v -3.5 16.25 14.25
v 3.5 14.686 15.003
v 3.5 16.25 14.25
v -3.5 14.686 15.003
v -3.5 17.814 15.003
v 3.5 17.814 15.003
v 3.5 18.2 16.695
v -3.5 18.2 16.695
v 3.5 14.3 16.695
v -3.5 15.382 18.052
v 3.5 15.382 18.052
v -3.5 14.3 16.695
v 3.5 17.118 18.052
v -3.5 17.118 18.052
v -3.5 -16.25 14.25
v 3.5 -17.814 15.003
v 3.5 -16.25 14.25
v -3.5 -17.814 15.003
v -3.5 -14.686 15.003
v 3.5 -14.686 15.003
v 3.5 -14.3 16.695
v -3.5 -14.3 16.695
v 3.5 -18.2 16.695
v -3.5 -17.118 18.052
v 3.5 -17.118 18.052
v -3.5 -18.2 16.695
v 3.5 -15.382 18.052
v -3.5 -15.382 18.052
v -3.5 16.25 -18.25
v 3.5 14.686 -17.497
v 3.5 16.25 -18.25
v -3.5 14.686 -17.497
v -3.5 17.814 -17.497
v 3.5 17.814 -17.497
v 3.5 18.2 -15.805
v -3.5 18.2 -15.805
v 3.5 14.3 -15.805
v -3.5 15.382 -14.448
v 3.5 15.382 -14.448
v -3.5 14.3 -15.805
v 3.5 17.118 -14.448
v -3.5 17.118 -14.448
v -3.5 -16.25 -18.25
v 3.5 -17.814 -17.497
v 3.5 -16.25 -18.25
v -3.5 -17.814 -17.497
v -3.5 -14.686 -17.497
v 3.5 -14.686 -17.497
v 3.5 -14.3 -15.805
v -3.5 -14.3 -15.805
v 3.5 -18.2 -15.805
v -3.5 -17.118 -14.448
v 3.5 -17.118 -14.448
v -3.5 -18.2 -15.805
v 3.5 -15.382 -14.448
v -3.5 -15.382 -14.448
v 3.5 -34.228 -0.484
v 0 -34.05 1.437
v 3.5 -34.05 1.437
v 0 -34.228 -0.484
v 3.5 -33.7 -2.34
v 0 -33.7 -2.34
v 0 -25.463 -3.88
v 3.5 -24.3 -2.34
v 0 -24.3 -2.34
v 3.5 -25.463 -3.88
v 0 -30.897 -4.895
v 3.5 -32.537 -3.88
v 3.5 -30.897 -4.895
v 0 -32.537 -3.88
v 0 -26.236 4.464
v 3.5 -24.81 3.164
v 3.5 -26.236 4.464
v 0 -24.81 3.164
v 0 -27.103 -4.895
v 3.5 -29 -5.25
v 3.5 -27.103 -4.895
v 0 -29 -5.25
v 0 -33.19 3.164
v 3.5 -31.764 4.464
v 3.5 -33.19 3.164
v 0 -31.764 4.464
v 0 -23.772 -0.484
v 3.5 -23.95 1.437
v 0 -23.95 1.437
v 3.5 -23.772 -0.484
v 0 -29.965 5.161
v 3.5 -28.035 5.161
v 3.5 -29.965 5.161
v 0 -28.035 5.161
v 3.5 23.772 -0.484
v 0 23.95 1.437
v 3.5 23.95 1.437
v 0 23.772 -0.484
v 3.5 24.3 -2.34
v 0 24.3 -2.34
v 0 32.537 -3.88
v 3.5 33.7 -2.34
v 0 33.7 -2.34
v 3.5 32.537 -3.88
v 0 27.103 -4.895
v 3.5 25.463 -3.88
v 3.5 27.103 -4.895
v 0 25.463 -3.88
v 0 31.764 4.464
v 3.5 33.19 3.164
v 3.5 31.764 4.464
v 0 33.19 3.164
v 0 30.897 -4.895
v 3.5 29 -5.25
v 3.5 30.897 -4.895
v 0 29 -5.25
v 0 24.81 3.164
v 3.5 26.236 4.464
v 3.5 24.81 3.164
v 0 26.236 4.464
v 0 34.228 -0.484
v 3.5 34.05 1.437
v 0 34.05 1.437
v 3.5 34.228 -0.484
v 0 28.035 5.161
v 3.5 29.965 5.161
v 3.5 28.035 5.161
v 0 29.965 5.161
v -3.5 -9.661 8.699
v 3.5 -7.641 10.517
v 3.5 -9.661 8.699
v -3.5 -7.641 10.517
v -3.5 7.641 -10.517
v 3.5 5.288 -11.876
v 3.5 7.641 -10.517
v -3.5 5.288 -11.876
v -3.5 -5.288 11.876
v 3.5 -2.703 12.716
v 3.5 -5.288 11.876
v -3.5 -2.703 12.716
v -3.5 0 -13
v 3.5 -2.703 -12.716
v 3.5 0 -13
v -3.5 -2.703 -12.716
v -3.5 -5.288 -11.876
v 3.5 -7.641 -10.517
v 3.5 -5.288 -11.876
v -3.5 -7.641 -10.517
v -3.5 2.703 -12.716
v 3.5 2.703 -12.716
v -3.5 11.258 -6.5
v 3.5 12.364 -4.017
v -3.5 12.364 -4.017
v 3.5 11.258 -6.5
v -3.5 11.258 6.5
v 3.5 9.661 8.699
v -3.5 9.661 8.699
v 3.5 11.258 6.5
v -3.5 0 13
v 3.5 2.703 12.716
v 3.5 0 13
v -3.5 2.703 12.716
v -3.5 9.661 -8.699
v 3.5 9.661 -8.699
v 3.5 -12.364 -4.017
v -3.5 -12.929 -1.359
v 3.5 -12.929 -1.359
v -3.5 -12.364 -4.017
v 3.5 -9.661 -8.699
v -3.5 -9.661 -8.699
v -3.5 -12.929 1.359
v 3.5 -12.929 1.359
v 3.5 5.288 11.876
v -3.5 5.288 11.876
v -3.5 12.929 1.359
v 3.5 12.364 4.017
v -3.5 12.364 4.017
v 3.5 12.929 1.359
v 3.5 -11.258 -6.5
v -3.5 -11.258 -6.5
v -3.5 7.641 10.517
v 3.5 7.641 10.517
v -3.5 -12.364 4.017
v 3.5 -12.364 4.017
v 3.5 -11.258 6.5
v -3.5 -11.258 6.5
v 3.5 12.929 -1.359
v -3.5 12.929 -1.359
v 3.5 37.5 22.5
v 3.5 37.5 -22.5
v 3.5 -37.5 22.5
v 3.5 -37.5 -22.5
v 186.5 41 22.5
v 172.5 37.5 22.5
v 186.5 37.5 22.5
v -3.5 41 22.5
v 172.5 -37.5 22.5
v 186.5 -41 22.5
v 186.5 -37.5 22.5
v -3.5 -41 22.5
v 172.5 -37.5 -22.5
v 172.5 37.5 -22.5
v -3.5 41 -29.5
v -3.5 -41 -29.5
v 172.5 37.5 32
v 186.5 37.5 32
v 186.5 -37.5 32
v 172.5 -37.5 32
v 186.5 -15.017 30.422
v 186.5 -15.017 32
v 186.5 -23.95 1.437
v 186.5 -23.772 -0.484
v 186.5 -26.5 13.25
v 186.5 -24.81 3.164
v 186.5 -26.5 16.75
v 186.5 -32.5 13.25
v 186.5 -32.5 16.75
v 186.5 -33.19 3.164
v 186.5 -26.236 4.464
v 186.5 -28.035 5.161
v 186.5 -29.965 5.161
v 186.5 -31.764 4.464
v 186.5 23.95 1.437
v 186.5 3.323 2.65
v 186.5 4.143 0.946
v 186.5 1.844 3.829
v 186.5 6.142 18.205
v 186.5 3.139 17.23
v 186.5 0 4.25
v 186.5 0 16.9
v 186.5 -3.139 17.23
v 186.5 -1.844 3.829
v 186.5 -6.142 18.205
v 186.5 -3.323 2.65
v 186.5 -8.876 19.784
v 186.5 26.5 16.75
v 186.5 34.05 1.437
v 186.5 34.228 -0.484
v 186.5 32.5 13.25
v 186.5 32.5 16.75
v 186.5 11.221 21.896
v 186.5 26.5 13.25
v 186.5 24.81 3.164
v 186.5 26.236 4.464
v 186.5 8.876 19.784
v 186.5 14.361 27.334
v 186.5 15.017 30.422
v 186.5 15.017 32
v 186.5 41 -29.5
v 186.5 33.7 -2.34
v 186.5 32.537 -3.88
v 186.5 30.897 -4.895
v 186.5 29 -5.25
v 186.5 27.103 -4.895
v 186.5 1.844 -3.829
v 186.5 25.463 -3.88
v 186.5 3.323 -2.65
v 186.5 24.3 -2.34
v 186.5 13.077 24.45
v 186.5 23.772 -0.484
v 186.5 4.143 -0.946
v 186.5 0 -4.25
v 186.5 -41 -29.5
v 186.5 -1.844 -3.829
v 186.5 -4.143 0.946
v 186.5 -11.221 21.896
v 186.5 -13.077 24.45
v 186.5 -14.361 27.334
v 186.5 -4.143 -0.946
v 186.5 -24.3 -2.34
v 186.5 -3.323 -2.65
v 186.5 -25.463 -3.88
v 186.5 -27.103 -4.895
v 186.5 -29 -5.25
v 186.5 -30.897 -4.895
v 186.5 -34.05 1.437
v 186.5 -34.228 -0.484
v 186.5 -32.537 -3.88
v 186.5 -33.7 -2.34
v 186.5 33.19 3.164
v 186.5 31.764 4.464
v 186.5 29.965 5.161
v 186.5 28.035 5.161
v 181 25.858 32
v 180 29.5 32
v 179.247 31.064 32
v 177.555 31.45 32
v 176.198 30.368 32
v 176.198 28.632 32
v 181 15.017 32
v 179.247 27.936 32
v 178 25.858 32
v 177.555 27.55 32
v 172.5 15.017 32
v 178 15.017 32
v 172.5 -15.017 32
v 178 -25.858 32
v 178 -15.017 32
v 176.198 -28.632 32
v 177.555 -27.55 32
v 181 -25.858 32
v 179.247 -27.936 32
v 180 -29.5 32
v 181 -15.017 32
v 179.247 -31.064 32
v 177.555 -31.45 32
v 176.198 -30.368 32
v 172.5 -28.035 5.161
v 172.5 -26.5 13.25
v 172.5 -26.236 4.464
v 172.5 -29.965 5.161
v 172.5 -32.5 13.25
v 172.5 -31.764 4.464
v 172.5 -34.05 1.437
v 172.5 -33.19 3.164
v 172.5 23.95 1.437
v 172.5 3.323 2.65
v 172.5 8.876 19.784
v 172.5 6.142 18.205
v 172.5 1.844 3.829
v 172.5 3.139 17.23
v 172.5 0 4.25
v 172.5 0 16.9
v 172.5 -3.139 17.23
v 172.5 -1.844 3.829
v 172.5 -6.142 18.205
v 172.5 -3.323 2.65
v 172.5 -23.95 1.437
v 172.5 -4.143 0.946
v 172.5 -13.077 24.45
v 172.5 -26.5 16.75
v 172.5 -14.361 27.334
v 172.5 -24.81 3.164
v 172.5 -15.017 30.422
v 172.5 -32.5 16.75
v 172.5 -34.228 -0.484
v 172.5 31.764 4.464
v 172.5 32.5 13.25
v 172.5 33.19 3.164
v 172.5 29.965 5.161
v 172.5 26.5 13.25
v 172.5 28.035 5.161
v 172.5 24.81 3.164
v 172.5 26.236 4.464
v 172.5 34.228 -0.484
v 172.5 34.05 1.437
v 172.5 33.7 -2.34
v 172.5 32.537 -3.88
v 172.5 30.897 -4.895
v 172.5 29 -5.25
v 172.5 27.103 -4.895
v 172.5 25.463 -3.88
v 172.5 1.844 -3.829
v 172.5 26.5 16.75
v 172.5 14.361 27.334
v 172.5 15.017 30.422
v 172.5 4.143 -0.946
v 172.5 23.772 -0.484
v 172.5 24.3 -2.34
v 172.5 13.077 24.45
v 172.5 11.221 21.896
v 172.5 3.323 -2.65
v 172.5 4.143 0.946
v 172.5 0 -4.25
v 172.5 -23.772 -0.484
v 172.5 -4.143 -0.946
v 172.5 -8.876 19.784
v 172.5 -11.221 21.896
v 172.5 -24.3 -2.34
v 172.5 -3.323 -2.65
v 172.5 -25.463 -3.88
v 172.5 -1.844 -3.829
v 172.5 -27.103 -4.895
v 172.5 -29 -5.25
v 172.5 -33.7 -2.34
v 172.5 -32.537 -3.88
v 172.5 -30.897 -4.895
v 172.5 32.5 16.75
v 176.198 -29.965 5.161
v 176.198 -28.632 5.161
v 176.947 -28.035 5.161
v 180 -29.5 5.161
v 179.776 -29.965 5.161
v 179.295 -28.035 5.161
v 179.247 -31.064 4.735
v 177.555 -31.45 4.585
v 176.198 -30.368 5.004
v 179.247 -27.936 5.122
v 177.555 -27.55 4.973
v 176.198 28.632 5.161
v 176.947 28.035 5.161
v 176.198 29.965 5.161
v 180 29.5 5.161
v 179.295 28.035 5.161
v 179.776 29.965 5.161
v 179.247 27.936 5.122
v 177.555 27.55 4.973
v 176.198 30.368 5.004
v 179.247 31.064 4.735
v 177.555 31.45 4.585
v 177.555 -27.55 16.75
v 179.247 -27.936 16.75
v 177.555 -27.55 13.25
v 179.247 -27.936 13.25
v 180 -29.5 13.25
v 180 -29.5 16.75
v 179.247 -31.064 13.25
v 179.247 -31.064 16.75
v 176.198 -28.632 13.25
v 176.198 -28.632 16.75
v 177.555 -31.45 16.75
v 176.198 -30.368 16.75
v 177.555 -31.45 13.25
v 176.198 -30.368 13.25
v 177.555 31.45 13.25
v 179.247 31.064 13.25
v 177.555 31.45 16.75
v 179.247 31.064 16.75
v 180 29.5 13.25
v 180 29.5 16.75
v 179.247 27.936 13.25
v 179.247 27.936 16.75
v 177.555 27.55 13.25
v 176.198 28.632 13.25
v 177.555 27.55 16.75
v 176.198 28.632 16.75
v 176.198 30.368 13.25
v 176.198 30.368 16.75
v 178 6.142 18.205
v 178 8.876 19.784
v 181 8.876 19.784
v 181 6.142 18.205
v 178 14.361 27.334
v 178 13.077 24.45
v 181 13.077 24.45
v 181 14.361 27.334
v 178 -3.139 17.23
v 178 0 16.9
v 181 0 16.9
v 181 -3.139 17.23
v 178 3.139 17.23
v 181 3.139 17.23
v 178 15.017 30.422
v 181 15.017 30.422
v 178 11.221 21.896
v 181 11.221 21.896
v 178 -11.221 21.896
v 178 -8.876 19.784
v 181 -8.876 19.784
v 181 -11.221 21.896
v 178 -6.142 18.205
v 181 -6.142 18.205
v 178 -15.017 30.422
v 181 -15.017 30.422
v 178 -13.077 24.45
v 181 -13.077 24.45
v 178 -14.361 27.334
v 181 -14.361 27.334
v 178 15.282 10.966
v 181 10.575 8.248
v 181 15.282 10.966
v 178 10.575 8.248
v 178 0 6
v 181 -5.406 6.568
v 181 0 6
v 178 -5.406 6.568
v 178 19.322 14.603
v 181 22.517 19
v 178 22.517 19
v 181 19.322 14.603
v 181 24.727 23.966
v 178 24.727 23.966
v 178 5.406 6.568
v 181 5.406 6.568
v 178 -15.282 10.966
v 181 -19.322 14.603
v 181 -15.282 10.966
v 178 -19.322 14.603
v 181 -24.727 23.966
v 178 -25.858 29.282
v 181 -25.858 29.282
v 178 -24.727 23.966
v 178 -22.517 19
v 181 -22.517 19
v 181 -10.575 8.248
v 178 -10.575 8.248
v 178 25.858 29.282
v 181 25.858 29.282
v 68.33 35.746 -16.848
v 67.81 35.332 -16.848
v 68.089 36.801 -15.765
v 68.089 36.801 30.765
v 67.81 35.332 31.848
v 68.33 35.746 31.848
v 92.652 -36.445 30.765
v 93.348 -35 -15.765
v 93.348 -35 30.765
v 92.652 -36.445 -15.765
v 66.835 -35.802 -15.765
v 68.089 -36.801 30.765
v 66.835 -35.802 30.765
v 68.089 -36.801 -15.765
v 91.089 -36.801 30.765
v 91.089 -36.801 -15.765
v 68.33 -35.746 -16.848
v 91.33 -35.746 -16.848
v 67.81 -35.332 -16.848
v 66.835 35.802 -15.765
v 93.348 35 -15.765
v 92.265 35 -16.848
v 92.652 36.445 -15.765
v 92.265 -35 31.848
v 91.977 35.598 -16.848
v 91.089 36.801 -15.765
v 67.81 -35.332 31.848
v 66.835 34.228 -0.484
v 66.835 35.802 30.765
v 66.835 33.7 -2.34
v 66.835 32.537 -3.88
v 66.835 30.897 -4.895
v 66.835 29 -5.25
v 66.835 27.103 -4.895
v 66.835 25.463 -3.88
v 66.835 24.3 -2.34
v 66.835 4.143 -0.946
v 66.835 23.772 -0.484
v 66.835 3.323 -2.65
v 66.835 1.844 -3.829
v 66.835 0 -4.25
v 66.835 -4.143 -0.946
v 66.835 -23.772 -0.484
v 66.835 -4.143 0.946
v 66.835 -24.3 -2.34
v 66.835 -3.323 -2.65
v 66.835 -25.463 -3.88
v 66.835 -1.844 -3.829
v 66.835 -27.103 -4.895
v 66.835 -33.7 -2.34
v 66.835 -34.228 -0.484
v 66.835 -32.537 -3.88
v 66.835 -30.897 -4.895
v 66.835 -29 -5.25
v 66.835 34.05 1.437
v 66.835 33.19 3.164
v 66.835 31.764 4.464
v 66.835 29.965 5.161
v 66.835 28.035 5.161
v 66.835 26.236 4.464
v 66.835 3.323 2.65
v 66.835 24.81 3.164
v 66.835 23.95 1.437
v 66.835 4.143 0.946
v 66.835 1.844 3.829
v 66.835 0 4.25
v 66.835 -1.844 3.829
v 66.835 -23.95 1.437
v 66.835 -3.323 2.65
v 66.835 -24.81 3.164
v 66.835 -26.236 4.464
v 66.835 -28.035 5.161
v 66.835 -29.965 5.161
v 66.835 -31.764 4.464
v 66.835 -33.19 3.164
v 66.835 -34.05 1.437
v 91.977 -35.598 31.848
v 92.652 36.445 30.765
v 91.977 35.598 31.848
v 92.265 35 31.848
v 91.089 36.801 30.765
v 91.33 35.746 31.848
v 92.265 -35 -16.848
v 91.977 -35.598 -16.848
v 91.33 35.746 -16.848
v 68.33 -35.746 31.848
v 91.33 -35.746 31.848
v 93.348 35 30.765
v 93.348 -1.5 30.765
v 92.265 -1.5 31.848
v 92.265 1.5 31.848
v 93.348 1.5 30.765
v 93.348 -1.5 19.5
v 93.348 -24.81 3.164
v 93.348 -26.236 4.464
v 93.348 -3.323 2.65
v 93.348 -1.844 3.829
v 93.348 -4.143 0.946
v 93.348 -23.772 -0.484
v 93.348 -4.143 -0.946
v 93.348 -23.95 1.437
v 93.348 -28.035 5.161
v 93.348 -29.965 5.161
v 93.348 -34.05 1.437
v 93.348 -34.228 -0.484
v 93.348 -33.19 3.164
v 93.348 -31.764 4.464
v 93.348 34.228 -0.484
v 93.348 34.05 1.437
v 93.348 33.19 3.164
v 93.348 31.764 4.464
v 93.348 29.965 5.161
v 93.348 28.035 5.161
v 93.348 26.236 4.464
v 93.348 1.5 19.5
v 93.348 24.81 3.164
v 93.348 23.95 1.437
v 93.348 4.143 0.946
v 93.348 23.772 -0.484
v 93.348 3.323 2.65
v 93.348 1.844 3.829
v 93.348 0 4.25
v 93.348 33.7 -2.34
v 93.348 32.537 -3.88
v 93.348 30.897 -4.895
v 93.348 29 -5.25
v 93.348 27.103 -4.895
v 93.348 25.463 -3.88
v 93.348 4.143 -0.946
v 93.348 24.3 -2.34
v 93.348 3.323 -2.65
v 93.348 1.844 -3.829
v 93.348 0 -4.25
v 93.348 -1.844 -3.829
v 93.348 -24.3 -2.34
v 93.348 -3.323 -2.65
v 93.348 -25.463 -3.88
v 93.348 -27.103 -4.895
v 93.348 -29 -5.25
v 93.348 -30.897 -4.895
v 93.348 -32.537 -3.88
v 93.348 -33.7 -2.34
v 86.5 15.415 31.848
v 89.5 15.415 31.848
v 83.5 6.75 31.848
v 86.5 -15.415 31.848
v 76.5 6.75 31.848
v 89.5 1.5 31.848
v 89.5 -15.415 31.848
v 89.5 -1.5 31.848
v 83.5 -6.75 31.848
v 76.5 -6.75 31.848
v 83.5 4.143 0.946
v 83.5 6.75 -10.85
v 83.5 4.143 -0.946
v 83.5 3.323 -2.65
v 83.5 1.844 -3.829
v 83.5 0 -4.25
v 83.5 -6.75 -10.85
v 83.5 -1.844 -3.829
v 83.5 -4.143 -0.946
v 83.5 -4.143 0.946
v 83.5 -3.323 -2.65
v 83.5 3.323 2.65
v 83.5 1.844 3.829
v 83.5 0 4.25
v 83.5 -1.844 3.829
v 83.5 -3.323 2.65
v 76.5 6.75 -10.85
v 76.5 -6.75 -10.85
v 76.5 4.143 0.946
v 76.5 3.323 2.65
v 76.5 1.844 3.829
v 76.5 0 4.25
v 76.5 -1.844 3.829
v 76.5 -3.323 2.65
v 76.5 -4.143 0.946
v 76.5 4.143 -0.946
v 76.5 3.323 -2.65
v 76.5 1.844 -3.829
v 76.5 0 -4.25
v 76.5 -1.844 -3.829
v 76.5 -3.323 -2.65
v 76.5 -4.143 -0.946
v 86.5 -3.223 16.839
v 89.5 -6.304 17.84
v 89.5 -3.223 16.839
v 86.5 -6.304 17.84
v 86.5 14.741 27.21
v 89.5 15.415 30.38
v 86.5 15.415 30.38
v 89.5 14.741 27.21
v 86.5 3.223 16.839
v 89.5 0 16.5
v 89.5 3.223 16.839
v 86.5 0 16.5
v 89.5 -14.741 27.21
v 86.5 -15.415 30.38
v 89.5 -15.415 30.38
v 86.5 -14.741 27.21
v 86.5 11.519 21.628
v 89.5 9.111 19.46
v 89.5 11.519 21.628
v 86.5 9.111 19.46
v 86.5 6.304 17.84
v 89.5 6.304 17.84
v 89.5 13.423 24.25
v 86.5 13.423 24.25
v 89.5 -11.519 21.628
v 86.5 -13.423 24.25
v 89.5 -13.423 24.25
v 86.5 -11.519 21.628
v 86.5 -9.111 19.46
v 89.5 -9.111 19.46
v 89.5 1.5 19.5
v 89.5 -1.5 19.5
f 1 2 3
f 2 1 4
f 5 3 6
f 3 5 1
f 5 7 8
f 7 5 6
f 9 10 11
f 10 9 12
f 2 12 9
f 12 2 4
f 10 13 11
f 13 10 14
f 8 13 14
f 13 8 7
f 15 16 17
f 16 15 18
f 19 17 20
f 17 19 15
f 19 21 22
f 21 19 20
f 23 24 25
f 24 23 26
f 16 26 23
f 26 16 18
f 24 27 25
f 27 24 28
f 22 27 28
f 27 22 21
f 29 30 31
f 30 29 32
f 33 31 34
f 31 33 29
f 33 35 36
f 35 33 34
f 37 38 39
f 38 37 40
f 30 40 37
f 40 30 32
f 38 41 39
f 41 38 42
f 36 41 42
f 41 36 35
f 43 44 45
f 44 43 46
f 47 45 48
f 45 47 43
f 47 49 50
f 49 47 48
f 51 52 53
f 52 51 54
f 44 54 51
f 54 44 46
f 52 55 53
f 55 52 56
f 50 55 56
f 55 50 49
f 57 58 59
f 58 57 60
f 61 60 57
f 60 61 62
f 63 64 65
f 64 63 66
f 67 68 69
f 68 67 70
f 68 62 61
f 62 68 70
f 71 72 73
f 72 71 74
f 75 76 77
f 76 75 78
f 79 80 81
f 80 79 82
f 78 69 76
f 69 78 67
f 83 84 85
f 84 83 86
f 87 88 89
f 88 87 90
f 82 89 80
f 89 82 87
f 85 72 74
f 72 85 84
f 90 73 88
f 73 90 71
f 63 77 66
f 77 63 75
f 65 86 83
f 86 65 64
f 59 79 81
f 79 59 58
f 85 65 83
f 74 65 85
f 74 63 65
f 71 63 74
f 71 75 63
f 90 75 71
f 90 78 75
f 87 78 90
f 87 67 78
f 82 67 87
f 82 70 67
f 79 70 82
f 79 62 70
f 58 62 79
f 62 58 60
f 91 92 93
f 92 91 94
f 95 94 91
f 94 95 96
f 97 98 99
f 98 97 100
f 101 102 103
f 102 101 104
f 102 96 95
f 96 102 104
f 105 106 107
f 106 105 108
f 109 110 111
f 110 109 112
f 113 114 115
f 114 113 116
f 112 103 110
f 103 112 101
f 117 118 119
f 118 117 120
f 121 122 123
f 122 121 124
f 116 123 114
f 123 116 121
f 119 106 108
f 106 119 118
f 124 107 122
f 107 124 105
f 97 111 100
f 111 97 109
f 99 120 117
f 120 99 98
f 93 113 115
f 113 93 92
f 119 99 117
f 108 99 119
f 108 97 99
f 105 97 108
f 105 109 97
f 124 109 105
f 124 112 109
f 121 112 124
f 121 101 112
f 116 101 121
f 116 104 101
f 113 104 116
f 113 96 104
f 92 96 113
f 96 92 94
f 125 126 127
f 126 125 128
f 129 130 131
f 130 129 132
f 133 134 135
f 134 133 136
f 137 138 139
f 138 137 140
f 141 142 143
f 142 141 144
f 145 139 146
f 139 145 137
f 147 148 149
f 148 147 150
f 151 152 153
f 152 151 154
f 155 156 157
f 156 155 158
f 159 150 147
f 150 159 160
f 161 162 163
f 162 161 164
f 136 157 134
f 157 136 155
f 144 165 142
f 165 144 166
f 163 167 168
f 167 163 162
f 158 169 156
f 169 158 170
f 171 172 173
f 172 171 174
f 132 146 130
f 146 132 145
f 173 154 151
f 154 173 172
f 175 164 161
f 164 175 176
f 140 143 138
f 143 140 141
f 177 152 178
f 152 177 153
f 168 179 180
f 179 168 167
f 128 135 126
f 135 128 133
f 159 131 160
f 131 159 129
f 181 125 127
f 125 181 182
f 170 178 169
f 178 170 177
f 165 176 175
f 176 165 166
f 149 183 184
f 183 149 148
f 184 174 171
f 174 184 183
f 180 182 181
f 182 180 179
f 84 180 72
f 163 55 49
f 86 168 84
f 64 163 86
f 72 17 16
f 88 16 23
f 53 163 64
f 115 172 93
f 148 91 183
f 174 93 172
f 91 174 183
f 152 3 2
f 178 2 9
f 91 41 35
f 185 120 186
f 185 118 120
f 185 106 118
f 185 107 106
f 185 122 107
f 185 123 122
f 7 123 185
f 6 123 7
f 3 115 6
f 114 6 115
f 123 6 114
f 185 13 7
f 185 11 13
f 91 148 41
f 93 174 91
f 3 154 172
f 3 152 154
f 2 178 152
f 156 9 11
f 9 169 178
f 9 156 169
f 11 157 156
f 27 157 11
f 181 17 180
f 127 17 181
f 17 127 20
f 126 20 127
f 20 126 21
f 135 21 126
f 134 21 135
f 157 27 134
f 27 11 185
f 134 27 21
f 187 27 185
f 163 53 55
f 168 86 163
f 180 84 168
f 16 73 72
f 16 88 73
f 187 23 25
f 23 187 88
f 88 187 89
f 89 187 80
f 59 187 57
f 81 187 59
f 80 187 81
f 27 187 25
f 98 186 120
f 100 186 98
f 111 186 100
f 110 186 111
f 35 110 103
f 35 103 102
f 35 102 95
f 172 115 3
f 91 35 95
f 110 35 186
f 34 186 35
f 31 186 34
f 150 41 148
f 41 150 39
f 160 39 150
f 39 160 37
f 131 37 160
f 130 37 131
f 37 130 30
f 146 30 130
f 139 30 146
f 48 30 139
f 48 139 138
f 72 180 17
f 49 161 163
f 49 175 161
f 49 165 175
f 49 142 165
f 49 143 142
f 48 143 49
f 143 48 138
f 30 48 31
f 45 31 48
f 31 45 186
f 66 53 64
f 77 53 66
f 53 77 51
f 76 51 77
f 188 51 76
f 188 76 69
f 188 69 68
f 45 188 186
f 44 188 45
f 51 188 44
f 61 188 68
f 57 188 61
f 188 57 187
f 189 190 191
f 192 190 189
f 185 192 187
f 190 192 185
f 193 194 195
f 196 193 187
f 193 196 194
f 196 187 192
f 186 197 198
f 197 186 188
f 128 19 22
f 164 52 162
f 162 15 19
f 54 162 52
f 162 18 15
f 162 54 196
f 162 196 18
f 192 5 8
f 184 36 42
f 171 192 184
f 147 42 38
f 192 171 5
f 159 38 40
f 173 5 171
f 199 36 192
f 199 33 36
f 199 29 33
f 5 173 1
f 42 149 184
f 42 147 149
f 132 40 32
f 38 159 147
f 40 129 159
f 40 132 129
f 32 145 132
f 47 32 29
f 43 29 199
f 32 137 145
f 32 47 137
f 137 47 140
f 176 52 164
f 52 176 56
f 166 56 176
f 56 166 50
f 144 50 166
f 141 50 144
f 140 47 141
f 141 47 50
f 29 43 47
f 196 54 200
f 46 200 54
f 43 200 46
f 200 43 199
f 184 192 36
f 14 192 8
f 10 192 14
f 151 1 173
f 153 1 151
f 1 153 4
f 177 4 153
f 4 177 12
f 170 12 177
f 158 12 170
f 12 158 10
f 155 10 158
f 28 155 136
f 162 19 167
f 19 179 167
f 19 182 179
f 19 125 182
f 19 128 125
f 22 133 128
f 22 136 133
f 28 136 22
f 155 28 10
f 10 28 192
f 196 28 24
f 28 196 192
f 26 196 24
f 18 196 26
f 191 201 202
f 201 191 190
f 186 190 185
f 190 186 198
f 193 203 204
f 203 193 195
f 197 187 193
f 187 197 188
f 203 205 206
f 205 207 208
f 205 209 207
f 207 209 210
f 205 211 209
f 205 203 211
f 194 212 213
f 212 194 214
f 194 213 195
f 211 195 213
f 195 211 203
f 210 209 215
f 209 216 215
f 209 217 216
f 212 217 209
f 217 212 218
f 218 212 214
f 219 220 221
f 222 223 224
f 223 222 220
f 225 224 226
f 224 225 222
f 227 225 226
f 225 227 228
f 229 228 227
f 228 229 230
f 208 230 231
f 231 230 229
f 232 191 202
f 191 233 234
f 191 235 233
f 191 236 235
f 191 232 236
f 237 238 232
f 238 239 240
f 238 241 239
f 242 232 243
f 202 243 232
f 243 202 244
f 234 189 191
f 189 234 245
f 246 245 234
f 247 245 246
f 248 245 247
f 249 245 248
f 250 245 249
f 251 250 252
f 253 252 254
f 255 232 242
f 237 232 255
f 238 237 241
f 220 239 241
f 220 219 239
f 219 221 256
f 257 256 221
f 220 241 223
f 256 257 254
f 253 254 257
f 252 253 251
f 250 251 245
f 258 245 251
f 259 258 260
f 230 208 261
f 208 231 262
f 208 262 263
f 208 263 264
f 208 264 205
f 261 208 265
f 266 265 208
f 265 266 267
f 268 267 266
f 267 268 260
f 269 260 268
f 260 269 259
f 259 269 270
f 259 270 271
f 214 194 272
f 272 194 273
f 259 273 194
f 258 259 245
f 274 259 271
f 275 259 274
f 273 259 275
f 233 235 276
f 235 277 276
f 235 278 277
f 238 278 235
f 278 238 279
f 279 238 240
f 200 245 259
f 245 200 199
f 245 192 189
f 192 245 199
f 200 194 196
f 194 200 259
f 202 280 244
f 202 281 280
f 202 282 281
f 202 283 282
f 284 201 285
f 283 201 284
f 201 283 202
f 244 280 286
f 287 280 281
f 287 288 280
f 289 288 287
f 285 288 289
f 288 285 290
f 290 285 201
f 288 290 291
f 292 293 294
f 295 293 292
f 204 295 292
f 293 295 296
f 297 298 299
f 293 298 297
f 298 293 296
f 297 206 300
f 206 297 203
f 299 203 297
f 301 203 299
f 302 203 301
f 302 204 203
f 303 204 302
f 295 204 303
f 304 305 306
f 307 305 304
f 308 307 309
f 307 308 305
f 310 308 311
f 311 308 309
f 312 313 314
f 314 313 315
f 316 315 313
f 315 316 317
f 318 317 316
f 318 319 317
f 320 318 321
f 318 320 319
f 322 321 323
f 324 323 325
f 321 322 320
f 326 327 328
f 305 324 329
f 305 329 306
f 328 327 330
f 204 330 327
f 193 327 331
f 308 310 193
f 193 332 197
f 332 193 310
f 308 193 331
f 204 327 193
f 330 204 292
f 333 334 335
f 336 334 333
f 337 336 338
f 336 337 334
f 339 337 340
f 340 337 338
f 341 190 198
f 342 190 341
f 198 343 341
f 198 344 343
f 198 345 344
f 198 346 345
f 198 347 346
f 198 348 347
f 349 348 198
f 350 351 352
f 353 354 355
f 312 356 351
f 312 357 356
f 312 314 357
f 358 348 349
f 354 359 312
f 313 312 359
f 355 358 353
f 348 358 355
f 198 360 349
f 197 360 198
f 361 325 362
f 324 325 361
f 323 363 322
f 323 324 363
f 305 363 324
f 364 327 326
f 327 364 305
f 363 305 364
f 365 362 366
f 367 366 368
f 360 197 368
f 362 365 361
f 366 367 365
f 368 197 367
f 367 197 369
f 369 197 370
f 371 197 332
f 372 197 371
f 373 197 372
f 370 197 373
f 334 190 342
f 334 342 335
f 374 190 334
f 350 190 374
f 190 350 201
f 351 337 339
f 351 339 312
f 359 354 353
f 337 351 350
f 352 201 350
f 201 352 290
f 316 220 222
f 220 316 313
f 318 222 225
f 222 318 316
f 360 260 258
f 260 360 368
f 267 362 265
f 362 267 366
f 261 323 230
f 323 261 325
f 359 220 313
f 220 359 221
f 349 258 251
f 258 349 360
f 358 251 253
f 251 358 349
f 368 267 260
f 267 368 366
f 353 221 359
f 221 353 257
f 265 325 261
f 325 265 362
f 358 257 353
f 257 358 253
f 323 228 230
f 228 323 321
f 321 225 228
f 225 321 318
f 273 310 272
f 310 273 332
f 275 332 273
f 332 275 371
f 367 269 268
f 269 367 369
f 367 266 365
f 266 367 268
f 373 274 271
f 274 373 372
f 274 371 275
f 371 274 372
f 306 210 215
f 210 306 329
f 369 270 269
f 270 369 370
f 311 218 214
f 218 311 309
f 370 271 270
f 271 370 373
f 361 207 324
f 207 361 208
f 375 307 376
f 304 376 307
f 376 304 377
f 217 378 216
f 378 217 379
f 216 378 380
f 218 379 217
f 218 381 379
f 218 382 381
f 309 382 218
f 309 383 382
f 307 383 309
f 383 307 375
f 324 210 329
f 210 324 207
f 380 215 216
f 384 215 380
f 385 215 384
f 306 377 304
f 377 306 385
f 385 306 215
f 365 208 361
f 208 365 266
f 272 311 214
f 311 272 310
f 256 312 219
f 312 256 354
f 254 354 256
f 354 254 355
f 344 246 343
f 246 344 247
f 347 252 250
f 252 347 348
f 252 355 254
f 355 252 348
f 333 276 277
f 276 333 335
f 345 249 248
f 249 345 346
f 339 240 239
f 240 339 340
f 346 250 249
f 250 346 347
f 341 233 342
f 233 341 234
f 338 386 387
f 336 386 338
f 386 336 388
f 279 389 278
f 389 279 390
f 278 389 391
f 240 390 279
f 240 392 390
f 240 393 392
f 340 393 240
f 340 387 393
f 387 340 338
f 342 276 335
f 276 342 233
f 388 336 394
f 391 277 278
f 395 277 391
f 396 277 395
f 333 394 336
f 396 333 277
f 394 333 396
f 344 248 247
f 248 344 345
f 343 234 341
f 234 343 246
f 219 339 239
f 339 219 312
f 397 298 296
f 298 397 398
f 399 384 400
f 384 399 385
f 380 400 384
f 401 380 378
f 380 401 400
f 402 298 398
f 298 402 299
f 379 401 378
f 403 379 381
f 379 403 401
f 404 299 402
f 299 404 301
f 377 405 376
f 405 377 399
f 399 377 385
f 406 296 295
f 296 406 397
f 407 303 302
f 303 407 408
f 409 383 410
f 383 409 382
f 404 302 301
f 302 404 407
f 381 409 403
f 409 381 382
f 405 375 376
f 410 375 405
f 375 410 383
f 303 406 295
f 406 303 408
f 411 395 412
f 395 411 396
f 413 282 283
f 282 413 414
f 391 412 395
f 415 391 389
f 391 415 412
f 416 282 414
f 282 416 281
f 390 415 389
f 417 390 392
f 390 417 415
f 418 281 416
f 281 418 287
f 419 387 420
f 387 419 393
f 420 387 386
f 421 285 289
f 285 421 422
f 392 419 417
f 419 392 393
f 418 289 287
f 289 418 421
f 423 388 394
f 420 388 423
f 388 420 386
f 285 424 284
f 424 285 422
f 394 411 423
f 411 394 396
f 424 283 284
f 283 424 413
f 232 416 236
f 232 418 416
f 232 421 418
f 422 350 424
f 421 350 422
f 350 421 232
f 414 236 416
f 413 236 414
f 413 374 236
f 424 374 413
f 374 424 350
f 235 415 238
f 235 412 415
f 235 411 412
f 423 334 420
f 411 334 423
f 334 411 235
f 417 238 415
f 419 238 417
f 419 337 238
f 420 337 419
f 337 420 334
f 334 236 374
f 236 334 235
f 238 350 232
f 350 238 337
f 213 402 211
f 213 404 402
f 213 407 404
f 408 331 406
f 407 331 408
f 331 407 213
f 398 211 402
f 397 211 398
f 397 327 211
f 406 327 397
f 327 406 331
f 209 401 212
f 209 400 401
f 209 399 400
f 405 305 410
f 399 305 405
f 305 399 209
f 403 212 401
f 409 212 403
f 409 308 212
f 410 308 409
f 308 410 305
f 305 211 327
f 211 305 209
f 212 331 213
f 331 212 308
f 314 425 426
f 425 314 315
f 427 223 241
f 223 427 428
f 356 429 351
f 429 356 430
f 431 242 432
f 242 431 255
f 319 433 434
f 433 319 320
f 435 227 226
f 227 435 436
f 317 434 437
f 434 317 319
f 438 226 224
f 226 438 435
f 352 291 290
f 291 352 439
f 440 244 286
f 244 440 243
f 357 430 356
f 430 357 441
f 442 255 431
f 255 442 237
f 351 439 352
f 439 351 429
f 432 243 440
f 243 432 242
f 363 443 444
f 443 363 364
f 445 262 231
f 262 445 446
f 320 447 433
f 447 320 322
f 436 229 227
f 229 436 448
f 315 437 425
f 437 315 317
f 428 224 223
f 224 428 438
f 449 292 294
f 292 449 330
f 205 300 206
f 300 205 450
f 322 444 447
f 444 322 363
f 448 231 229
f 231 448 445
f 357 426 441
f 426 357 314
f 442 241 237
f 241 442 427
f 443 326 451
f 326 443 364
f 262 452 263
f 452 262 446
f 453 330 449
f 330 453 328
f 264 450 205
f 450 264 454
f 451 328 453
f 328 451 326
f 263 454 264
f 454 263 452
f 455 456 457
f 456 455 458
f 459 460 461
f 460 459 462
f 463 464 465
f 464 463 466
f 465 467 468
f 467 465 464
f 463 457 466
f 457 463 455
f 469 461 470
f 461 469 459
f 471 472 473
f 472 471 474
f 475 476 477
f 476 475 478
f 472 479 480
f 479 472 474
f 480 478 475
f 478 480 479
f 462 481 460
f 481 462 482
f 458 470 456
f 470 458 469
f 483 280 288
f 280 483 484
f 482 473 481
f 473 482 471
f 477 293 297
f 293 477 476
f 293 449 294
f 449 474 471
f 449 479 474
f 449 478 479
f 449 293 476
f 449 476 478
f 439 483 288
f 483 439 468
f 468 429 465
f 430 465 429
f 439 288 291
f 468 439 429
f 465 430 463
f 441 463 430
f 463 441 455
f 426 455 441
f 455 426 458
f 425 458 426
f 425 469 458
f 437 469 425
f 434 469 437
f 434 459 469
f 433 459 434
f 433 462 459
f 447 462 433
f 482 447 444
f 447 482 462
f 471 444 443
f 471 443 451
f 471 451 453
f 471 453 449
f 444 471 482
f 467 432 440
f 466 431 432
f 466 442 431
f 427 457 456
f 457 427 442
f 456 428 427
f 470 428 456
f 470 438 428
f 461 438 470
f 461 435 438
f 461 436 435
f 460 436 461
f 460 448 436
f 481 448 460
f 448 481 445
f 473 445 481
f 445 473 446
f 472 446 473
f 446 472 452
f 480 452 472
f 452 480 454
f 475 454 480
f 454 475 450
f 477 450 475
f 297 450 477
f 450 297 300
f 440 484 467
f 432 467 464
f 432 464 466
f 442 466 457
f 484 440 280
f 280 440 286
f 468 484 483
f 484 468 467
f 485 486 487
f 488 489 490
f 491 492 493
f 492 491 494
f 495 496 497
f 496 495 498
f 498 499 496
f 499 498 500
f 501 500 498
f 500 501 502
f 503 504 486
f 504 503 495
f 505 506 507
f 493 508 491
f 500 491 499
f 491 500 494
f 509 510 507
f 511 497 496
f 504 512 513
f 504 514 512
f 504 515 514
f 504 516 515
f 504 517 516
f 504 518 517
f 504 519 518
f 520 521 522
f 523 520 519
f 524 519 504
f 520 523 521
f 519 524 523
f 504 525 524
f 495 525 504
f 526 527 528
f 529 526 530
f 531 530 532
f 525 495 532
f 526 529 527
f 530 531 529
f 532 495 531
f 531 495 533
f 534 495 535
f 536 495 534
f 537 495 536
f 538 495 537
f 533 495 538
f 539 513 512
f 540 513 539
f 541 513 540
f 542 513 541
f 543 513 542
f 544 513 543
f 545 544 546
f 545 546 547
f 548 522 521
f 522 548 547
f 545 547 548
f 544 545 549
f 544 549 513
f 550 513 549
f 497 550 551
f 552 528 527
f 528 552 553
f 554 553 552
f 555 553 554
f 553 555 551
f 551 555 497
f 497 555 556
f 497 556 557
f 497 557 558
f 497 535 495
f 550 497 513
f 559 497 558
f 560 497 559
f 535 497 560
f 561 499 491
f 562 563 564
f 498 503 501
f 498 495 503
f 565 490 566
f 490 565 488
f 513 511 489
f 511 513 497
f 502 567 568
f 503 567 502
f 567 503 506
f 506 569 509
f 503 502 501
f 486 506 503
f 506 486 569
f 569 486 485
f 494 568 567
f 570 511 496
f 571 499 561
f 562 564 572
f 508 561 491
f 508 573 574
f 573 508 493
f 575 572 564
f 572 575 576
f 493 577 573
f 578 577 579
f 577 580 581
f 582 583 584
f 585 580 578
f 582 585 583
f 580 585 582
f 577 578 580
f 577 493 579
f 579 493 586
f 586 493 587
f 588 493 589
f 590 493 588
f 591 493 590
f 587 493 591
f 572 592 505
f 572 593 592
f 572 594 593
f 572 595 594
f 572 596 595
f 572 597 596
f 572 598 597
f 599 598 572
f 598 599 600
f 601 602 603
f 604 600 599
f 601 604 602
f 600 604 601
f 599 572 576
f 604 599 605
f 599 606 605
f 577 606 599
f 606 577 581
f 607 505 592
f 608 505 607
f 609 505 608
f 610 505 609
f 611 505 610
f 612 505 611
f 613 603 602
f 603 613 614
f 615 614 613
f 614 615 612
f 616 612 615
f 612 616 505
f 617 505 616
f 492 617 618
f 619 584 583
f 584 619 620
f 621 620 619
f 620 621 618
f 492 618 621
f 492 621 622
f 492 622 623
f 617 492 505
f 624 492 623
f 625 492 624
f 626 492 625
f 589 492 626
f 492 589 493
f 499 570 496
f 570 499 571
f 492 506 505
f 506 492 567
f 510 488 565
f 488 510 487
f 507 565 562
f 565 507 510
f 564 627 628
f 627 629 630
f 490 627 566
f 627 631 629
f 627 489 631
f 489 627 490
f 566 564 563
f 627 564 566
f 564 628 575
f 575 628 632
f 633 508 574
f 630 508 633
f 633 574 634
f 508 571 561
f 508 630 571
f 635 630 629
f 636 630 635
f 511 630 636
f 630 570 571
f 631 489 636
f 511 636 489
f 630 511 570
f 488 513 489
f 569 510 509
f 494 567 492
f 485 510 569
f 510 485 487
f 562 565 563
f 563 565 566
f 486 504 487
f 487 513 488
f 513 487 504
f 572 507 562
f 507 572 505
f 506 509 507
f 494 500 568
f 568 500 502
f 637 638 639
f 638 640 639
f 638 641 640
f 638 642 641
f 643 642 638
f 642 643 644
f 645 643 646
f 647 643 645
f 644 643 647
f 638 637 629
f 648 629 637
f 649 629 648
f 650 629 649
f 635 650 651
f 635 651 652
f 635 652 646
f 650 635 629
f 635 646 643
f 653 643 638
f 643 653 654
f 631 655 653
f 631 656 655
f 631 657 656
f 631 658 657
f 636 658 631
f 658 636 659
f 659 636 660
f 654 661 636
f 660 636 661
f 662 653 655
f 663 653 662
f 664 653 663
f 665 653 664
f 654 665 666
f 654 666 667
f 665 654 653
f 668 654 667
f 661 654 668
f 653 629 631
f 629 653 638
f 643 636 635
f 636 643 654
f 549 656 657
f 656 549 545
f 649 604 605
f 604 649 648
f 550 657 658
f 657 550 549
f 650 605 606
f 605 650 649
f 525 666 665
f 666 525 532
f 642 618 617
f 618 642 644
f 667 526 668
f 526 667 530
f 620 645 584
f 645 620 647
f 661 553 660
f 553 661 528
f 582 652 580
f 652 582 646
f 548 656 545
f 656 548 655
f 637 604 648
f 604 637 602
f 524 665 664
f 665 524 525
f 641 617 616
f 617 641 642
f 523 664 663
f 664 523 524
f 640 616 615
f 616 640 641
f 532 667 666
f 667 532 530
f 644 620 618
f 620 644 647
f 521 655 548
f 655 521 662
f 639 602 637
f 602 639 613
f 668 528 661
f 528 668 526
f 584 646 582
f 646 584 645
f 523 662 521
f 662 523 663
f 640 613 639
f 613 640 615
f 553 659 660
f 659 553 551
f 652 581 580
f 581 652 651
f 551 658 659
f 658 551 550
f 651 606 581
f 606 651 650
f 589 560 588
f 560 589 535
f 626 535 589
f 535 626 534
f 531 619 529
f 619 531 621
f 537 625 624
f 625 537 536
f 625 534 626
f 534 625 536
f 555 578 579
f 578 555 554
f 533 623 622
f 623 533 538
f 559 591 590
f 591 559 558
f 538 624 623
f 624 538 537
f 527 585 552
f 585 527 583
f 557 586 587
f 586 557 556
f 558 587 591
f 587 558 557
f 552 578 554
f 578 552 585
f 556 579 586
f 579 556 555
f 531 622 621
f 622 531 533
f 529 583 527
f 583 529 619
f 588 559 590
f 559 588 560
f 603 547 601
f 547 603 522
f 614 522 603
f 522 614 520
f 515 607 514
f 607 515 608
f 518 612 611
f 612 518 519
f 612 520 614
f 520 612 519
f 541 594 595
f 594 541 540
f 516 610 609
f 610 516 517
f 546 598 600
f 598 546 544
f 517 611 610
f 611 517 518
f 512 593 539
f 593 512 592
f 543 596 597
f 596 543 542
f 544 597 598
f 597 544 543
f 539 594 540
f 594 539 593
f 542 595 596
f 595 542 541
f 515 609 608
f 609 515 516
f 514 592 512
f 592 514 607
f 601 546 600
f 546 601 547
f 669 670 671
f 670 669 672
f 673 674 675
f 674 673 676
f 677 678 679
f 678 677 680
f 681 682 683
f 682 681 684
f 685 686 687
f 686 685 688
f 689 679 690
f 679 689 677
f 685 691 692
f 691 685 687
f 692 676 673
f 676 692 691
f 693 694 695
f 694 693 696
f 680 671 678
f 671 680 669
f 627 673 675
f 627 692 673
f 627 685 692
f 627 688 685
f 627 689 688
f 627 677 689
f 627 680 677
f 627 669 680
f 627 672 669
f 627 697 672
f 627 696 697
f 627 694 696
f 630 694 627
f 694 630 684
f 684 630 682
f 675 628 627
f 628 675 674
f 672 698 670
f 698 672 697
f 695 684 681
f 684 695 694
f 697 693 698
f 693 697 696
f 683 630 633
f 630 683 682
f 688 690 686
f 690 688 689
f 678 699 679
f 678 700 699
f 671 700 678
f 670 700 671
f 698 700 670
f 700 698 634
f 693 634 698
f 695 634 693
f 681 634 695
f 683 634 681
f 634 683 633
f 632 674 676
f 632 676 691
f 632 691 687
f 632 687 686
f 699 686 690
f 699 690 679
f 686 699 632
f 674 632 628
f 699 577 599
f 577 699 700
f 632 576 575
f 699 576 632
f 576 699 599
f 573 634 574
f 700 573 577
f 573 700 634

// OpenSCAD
// It is licensed under the Creative Commons - GNU GPL license.
// © 2022 by Ricardo Espinosa

metrica=4;

/****  Pieza A *****/
xA=7; // espesor
yA=75;
zA=45;// alto a ajustar
distanciaPasantesMotor=32.5;
radioHusillo=4.25;
radioGuias=radioHusillo+1;
longHusillo=200;
ajusteMotor=13-xA;
distanciaGuias=29;
ajuste=5;

/****  Pieza B *****/
xB=190; // longitud total pieza

/****  Pieza C *****/
xC=220;

/****  Pieza D *****/
xD=80;
tuercaX=7;
tuercaY=15.5;
tuercaZ=13.5;

/**** Jeringuilla ****/
diametroJeringuilla=30.2;
rJ=diametroJeringuilla/2;
rJ2=26;//tope de la jeringa
aJ=zA-13; //alto Jeringa
rJ3=15.5;

//--PIEZA A

color("blue"){
    difference(){
    cube ([xA,yA,zA], center=true);

        //tornillos pasantes motor

        union(){
        translate([0, distanciaPasantesMotor/2, distanciaPasantesMotor/2])
        rotate([0,90,0])
        cylinder(h=xA*5,r=metrica/2, center=true);    

        translate([0, -distanciaPasantesMotor/2, distanciaPasantesMotor/2])
        rotate([0,90,0])
        cylinder(h=xA*5,r=metrica/2, center=true);

        translate([0, distanciaPasantesMotor/2, -distanciaPasantesMotor/2])
        rotate([0,90,0])
        cylinder(h=xA*5,r=metrica/2, center=true);

        translate([0, -distanciaPasantesMotor/2, -distanciaPasantesMotor/2])
        rotate([0,90,0])
        cylinder(h=xA*5,r=metrica/2, center=true);

        // encaje guias
        rotate([0,90,0])
        translate([0,-distanciaGuias,0])
        cylinder(h=longHusillo, r=radioGuias);

        rotate([0,90,0])
        translate([0,distanciaGuias,0])
        cylinder(h=longHusillo, r=radioGuias);
 
        // agujero pasante motor
        rotate([0,90,0])
        cylinder(h=xA*2, r=13, center=true);
        }
    }
}

//--PIEZA B
color("red")
translate([xB/2-xA/2,0,-zA/2-xA/2])
cube ([xB,yA,xA], center=true);

//--PIEZA C y D
color("gray"){
translate([xB/2-xA/2,yA/2+xA/4,-xA/2])
cube ([xB,xA/2,zA+xA], center=true);

translate([xB/2-xA/2,-yA/2-xA/4,-xA/2])
cube ([xB,xA/2,zA+xA], center=true);
}
//--PIEZA E
color("green"){
    difference(){
        translate([xB-xA*2-xA/2,-yA/2,-zA/2])
        cube ([xA*2,yA,aJ+zA/2]);
    
        //husillo y guias
        rotate([0,90,0])
        cylinder(h=longHusillo, r=radioHusillo);
        rotate([0,90,0])
        translate([0,-distanciaGuias,0])
        cylinder(h=longHusillo, r=radioGuias);
        rotate([0,90,0])
        translate([0,distanciaGuias,0])
        cylinder(h=longHusillo, r=radioGuias);
    
        // sujeción guias
        translate([xB-xA*2+metrica/2,-distanciaGuias-0.5,0])
        cylinder(h=aJ+zA/2, r=metrica/2);
        translate([xB-xA*2+metrica/2,distanciaGuias+0.5,0])
        cylinder(h=aJ+zA/2, r=metrica/2);
        translate([xB-xA*2+metrica/2,distanciaGuias+0.5,15])
        cube([xA*4,6,3.5], center=true);
        translate([xB-xA*2+metrica/2,-distanciaGuias-0.5,15])
        cube([xA*4,6,3.5], center=true);

        //-- acople jeringa
        translate([xB-xA*0.6,0,aJ])
        rotate([0,90,0])
        cylinder (h=30,r=rJ, center=true);
        translate([xB-xA-xA*0.5,0,aJ])
        rotate([0,90,0])
        cylinder (h=3,r=rJ2, center=true);
    }
}
//--PIEZA D

difference(){
translate([xD,0,7.5])
minkowski(){
cube ([xA*4-ajuste, yA-ajuste, zA], center=true);  
sphere(2);
}
//tuerca
translate([xD,0,tuercaY*1.3])
cube([tuercaX, tuercaZ, tuercaY*4], center=true);

//husillos
rotate([0,90,0])
cylinder(h=longHusillo, r=radioHusillo, center=true);
rotate([0,90,0])
translate([0,-distanciaGuias,0])
cylinder(h=longHusillo, r=radioGuias, center=true);
rotate([0,90,0])
translate([0,distanciaGuias,0])
cylinder(h=longHusillo, r=radioGuias, center=true);

// porta jerniga
translate([xD+8,0,aJ])
rotate([0,90,0])
cylinder (h=3,r=15.5, center=true);
translate([xD+15,0,26])
cube ([13, 3, 13], center=true);
}
